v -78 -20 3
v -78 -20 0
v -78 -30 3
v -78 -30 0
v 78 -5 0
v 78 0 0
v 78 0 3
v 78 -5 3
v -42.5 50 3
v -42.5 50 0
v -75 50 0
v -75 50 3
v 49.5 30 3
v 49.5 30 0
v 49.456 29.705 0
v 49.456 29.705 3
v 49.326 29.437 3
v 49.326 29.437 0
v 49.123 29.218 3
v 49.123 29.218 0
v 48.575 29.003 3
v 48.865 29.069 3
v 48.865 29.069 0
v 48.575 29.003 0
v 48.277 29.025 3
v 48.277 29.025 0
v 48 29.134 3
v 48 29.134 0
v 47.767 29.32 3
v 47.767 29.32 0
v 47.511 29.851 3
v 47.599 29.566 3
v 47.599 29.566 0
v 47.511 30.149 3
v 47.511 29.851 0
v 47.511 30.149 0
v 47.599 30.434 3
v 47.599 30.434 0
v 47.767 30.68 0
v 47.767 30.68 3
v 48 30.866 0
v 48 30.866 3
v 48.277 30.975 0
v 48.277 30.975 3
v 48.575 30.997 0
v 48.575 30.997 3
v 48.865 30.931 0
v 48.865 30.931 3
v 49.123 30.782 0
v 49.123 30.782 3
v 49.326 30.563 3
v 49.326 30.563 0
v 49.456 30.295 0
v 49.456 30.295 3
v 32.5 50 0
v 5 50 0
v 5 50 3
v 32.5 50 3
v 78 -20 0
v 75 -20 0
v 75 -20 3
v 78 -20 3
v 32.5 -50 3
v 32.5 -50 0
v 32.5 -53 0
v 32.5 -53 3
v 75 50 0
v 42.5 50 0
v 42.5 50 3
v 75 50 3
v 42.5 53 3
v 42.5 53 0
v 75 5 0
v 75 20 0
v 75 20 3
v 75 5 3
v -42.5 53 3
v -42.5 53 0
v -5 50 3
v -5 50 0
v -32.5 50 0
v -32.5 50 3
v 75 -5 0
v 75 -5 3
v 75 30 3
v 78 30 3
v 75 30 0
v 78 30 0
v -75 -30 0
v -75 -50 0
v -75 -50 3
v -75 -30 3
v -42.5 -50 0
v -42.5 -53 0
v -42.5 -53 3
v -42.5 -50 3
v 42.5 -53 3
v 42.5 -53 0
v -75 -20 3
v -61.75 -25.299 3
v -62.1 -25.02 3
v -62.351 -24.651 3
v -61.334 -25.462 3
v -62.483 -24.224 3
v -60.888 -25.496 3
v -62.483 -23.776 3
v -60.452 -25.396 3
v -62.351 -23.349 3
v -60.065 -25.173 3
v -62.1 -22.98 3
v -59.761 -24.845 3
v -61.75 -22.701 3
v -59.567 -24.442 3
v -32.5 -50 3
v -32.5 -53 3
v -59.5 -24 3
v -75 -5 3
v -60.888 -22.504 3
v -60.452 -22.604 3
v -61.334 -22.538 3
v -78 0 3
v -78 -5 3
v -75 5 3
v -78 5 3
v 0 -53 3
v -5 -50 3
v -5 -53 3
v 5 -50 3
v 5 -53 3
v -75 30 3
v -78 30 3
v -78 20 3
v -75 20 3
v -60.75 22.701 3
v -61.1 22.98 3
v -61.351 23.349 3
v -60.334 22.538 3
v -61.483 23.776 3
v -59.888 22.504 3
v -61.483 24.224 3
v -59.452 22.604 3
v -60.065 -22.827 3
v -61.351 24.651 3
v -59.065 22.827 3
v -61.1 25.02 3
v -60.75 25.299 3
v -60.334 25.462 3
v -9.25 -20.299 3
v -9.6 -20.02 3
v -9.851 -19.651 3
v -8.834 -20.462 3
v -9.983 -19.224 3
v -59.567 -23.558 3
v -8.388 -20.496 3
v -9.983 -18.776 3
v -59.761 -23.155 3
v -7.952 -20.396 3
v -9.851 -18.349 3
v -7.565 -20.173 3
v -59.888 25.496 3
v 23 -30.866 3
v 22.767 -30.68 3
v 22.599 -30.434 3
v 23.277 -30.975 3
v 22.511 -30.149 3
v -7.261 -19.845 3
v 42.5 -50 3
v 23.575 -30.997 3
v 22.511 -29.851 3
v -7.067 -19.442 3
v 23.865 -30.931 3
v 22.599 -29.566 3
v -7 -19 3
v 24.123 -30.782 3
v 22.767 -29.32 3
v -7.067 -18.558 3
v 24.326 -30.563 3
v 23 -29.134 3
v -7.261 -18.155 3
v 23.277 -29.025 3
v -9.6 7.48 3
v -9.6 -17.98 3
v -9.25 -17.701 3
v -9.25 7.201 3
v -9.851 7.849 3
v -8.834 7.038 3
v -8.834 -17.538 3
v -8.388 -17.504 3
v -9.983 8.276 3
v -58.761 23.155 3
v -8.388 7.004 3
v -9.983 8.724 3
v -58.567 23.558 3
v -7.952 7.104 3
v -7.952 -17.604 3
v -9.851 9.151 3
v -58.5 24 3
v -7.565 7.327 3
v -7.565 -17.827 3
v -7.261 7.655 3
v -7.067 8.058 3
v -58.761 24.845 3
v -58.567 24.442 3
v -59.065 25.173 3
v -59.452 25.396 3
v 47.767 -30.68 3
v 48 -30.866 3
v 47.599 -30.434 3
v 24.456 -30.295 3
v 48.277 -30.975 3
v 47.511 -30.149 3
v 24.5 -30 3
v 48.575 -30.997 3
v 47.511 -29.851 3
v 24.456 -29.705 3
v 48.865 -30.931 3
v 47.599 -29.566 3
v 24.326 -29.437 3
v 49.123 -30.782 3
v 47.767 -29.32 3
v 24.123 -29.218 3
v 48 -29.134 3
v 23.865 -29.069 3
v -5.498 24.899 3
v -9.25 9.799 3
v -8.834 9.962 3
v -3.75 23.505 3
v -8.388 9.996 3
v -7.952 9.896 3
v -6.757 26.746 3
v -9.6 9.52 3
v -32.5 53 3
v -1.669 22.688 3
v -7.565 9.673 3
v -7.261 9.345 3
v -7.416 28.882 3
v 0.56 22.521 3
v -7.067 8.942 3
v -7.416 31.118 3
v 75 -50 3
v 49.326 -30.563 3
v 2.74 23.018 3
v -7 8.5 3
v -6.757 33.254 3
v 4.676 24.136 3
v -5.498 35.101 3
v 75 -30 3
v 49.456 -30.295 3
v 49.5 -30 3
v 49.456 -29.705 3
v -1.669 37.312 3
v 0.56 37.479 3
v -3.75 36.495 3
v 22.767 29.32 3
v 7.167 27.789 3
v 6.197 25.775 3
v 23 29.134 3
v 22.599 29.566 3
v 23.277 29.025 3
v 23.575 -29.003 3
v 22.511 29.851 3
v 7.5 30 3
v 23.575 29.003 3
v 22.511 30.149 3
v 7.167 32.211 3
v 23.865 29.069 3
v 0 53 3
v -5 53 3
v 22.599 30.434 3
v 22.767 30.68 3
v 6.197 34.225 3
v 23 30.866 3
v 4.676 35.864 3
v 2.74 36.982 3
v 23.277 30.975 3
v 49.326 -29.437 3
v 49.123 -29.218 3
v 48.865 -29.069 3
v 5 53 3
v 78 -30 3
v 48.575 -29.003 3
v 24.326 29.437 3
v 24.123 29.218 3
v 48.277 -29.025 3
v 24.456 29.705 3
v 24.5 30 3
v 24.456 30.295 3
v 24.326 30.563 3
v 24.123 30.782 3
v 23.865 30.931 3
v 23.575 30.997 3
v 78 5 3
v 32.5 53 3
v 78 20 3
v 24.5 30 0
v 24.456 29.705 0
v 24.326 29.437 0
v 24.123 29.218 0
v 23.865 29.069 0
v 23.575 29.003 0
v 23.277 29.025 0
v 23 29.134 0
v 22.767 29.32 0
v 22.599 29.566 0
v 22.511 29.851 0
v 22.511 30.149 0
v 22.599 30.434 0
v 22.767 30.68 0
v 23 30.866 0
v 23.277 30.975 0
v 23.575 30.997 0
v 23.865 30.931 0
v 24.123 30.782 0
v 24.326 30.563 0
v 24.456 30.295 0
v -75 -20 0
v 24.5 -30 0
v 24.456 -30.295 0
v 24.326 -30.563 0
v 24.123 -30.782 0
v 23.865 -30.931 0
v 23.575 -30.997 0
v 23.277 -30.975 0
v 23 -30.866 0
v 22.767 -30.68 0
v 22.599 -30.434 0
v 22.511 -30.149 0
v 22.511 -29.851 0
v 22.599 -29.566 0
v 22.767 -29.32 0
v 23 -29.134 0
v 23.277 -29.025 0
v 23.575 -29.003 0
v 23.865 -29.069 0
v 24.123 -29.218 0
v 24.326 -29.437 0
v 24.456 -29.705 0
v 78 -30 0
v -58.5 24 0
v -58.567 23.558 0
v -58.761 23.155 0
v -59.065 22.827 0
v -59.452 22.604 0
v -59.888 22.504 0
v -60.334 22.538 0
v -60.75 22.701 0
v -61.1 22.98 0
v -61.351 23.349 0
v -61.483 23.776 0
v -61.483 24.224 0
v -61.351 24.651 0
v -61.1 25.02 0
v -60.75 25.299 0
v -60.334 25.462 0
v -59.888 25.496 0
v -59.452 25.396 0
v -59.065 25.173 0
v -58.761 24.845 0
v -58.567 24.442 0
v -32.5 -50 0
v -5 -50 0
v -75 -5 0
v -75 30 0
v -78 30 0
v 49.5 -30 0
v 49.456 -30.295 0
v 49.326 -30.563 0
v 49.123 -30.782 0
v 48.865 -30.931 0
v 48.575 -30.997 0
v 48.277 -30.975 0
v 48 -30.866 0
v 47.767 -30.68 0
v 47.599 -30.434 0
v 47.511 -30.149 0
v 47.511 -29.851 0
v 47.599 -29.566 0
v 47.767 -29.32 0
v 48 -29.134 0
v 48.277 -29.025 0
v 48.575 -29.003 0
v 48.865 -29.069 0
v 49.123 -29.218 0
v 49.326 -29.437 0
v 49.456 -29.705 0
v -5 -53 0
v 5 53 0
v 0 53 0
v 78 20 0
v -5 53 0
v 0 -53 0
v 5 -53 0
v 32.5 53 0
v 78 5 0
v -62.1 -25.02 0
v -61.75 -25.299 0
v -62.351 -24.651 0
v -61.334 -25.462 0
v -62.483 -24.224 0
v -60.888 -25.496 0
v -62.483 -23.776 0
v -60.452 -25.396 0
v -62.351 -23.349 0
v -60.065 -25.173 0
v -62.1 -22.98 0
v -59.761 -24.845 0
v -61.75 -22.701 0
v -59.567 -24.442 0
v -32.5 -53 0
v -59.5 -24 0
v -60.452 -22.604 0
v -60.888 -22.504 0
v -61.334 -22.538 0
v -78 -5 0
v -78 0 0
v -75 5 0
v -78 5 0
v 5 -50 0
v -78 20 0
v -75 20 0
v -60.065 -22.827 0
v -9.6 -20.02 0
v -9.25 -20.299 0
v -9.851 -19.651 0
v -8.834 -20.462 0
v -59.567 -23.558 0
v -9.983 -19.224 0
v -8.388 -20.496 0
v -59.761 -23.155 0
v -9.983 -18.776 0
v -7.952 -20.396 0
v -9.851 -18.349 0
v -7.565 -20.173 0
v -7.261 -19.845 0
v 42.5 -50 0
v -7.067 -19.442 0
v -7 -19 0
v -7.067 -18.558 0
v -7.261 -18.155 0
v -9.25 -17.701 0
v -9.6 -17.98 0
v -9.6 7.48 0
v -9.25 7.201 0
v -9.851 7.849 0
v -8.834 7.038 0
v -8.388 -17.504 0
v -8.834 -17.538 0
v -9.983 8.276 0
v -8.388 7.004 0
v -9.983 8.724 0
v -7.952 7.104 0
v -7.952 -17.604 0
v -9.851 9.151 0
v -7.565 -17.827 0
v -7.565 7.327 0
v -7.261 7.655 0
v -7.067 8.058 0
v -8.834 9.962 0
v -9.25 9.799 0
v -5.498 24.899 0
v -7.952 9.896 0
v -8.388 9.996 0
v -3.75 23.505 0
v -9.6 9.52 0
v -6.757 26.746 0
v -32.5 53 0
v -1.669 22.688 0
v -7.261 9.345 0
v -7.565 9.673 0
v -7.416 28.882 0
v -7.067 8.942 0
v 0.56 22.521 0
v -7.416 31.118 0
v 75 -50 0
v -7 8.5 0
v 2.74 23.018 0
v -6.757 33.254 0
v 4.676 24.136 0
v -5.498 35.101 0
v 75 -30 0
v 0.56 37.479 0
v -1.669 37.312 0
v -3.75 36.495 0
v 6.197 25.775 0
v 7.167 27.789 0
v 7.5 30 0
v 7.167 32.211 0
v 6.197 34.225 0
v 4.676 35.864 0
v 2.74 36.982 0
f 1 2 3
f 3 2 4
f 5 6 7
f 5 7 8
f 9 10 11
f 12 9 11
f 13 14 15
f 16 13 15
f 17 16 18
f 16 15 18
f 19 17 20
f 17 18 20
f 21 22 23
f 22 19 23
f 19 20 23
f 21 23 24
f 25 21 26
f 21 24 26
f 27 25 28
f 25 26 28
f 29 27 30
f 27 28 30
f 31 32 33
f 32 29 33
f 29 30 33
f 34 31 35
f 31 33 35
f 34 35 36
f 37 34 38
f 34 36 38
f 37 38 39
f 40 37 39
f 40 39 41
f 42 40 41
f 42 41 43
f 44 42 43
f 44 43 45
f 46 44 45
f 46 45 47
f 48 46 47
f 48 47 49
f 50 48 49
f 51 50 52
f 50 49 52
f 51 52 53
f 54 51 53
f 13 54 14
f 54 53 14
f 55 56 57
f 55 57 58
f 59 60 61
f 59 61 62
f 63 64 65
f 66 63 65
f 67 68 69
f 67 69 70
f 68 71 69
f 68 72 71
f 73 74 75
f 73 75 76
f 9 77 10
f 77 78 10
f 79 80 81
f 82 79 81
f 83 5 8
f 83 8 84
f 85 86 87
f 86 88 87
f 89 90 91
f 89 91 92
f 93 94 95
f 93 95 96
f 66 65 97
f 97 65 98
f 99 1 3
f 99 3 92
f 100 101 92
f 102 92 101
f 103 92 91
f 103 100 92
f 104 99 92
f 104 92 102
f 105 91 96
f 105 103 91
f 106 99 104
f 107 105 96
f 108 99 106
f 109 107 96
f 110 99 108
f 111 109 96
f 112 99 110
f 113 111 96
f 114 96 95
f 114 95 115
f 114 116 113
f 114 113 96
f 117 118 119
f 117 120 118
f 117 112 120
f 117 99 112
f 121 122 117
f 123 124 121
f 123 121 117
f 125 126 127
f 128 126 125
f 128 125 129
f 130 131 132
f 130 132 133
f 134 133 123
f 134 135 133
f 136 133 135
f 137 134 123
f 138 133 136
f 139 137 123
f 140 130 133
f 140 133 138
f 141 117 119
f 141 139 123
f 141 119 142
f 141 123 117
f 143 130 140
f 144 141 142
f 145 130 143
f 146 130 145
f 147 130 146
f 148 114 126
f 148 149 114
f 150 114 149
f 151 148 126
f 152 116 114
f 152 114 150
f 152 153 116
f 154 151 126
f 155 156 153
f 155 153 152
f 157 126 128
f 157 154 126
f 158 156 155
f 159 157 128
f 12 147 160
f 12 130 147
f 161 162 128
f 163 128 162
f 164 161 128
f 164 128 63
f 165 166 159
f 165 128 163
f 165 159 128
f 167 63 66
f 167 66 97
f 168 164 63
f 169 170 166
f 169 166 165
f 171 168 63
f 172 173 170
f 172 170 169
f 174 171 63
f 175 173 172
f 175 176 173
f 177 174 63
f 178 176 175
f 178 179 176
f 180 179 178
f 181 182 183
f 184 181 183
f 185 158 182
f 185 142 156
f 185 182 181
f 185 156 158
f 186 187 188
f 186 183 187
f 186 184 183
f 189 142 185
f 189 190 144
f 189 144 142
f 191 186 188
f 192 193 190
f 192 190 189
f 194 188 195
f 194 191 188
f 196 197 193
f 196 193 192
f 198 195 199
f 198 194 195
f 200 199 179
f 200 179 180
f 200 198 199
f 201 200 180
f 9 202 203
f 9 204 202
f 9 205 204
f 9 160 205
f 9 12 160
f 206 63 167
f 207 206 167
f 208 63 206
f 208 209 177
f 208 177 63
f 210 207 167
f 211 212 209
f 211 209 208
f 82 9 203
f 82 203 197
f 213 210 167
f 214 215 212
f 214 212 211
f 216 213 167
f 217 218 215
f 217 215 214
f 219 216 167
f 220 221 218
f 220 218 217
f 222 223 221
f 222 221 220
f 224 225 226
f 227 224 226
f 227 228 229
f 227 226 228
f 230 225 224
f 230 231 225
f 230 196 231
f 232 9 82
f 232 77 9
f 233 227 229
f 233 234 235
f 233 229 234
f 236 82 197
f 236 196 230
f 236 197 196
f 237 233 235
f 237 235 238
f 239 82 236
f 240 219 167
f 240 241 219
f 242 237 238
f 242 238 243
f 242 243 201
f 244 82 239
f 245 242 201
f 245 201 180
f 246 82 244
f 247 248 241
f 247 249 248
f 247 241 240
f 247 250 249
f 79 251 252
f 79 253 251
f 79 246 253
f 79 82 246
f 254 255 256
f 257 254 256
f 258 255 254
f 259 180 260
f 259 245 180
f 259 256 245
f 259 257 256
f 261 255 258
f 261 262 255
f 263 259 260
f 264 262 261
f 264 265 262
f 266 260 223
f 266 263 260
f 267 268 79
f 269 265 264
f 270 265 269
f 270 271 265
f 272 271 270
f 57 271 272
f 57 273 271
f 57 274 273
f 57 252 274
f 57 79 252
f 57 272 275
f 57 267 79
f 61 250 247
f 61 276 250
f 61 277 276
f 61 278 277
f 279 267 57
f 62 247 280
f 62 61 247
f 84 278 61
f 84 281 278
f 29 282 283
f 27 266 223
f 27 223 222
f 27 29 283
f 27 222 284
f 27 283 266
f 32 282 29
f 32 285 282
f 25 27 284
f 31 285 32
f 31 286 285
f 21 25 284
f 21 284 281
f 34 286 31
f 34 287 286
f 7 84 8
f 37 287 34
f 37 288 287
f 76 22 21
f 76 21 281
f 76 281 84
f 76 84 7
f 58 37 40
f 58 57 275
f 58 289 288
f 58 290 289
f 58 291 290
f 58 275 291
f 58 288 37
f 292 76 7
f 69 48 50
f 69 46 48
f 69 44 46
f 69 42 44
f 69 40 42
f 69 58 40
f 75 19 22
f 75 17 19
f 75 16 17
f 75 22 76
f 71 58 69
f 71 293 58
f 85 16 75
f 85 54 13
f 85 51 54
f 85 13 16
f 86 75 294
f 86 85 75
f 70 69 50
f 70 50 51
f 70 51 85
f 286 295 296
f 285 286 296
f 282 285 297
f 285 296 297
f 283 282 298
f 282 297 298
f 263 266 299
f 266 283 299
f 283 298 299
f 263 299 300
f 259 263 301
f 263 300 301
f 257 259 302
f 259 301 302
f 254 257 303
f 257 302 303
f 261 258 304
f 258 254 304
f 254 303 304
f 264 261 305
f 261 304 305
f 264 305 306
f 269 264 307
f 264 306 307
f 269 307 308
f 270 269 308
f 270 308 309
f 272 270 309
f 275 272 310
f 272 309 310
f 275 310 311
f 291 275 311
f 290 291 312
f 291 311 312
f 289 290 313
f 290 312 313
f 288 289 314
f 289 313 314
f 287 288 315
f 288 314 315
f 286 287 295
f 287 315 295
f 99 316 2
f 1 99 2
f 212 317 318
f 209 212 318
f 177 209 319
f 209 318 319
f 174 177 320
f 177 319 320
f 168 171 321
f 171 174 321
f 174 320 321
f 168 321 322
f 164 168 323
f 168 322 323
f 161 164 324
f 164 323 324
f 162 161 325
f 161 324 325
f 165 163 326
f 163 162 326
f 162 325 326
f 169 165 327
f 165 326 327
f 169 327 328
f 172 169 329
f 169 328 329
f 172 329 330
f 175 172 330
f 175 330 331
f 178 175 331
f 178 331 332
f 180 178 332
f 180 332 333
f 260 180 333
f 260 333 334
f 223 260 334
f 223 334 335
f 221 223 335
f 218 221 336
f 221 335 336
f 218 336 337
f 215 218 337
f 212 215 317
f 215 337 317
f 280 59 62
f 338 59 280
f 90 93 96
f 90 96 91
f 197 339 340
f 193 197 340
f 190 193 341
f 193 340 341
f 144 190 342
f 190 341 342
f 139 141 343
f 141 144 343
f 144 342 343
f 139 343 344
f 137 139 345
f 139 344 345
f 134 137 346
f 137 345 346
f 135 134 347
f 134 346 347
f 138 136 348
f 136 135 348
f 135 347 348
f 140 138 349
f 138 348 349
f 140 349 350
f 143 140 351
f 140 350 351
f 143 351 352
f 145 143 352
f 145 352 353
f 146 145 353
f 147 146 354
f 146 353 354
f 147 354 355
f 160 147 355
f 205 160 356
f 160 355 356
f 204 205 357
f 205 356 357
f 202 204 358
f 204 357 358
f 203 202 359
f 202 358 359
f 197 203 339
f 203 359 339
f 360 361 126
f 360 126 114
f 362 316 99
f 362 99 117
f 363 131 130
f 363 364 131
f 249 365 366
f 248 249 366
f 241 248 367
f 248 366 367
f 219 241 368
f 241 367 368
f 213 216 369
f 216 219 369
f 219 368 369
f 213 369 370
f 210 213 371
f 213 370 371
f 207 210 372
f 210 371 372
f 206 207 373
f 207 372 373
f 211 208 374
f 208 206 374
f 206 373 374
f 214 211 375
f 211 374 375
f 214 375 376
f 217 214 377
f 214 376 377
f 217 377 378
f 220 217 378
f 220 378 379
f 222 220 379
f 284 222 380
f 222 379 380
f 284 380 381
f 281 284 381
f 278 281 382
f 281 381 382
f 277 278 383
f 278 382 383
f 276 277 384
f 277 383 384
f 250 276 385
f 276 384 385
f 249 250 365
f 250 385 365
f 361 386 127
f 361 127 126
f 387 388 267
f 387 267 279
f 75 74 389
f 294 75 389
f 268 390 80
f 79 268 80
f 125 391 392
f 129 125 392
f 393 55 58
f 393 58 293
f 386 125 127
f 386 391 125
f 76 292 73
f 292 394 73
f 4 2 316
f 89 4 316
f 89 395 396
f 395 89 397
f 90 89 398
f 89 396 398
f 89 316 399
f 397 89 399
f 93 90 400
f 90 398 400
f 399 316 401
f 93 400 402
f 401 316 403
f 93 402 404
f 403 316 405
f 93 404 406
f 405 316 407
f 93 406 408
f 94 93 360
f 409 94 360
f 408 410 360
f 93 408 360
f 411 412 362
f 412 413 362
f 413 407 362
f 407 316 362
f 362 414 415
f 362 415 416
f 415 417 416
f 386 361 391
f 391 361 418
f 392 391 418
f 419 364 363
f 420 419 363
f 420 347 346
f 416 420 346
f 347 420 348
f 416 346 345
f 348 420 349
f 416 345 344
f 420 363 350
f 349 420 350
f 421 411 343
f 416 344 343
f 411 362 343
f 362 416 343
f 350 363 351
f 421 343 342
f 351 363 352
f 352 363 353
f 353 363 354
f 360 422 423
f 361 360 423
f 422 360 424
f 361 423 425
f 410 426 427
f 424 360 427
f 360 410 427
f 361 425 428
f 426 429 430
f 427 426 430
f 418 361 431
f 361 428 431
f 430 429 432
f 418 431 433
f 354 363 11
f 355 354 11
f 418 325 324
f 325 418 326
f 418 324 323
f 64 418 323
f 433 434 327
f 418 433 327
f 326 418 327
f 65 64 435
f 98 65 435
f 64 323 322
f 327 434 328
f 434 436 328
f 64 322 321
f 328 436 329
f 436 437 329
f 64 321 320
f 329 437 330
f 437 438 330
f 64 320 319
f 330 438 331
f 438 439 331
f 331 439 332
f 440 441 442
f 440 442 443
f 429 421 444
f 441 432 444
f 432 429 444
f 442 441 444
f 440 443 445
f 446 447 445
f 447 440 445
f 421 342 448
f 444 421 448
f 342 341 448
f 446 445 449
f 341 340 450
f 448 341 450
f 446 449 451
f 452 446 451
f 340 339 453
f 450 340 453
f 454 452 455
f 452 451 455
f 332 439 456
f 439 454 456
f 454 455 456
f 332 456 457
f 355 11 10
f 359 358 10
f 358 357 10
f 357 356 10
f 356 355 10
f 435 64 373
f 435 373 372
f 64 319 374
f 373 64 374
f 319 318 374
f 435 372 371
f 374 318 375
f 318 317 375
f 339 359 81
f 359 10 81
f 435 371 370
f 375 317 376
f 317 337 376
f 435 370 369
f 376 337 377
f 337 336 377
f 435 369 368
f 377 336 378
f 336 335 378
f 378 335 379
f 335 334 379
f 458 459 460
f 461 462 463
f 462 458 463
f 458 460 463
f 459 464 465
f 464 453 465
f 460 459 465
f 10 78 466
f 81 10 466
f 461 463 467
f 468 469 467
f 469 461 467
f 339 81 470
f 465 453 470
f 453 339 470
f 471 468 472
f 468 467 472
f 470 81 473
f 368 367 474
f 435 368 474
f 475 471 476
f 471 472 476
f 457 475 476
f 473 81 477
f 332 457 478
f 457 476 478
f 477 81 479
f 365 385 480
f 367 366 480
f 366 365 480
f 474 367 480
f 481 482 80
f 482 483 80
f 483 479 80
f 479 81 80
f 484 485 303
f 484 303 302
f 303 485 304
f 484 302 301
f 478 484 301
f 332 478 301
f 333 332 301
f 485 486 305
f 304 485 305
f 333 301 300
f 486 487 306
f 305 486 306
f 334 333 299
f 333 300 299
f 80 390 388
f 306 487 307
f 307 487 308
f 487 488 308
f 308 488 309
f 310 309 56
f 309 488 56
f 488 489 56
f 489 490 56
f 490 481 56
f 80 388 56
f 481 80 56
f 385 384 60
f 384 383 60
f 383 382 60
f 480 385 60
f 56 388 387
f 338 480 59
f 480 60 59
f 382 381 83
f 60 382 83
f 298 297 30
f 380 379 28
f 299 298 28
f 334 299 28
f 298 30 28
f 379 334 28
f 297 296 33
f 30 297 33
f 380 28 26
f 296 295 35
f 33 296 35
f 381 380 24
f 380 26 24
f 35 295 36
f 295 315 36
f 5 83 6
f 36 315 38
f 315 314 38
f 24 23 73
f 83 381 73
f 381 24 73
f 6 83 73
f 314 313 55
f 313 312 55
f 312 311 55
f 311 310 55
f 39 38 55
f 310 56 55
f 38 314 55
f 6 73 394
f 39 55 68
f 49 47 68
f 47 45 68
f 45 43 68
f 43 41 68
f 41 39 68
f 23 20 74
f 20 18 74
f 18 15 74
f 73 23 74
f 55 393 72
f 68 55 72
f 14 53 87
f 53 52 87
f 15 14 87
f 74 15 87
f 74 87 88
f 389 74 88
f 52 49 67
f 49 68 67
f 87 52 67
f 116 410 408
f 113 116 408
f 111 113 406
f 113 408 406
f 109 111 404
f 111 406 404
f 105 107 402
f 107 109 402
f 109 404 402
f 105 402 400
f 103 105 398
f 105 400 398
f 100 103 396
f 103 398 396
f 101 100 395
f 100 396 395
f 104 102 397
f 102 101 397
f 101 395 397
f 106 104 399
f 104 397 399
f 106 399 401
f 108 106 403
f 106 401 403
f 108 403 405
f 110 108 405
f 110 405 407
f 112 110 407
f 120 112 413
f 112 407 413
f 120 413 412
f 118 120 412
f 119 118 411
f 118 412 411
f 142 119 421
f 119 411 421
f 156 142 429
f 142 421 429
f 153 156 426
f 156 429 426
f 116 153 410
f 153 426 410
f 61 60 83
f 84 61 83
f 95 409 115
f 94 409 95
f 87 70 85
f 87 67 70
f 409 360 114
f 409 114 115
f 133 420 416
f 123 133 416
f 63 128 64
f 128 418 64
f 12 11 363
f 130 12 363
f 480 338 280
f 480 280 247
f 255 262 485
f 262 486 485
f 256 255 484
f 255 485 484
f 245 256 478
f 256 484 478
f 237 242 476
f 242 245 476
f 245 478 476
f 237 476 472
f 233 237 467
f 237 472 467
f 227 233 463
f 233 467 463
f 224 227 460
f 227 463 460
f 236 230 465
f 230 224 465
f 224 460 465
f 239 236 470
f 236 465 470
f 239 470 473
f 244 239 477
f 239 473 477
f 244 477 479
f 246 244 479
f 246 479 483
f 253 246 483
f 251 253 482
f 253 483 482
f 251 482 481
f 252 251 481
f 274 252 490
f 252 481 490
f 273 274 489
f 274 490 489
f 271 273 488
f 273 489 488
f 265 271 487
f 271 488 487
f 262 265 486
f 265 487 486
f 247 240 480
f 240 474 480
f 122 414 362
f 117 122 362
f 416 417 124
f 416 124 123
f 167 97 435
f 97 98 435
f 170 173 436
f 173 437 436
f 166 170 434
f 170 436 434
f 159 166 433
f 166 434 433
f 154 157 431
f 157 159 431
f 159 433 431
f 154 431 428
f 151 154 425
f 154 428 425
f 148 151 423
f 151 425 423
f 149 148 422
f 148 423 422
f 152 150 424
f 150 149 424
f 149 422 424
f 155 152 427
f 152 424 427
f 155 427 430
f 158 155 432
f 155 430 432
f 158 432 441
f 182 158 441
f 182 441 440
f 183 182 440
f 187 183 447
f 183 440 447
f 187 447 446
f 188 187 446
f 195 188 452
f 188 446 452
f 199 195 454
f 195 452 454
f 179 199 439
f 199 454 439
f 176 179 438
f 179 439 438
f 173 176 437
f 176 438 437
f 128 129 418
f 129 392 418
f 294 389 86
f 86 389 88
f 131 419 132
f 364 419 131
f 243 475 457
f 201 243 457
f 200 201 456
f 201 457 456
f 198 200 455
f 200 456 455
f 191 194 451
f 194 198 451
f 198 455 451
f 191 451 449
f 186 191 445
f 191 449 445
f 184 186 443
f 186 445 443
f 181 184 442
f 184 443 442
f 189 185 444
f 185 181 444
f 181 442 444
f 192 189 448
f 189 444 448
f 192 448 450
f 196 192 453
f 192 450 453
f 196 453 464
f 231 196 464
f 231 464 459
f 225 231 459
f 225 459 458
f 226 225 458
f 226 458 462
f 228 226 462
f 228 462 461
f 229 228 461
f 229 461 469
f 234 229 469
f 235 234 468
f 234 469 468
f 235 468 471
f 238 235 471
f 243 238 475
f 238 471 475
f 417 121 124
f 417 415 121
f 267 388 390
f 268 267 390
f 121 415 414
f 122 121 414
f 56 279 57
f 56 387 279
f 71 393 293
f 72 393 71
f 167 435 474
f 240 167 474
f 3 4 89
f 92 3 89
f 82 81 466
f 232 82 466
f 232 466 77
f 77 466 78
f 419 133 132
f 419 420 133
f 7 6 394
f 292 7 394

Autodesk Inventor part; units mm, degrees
ref_plane "YZ Plane" through (0, 0, 0) normal (1, 0, 0) x (0, 1, 0)
ref_plane "XZ Plane" through (0, 0, 0) normal (0, 1, 0) x (-1, 0, 0)
ref_plane "XY Plane" through (0, 0, 0) normal (0, 0, 1) x (1, 0, 0)
sketch "Эскиз1" plane through (0, 0, 0) normal (0, 0, 1) x (1, 0, 0)
  line L0 (0, 53) -> (5, 53)
  line L1 (5, 53) -> (5, 50)
  line L2 (32.5, 53) -> (42.5, 53)
  line L3 (42.5, 53) -> (42.5, 50)
  line L4 (32.5, 50) -> (32.5, 53)
  line L5 (78, 30) -> (75, 30)
  line L6 (75, 20) -> (78, 20)
  line L7 (78, 20) -> (78, 30)
  line L8 (78, 5) -> (75, 5)
  line L9 (78, 0) -> (78, 5)
  line L10 (5, 50) -> (32.5, 50)
  line L11 (42.5, 50) -> (75, 50)
  line L12 (5, 50) -> (32.5, 50)
  line L13 (42.5, 50) -> (75, 50)
  line L14 (75, 50) -> (75, 30)
  line L15 (75, 20) -> (75, 5)
  line L16 (75, 50) -> (75, 30)
  line L17 (75, 20) -> (75, 5)
  line L18 (0, -53) -> (5, -53)
  line L19 (5, -53) -> (5, -50)
  line L20 (32.5, -53) -> (42.5, -53)
  line L21 (42.5, -53) -> (42.5, -50)
  line L22 (32.5, -50) -> (32.5, -53)
  line L23 (78, -30) -> (75, -30)
  line L24 (75, -20) -> (78, -20)
  line L25 (78, -20) -> (78, -30)
  line L26 (78, -5) -> (75, -5)
  line L27 (78, 0) -> (78, -5)
  line L28 (5, -50) -> (32.5, -50)
  line L29 (42.5, -50) -> (75, -50)
  line L30 (5, -50) -> (32.5, -50)
  line L31 (42.5, -50) -> (75, -50)
  line L32 (75, -50) -> (75, -30)
  line L33 (75, -20) -> (75, -5)
  line L34 (75, -50) -> (75, -30)
  line L35 (75, -20) -> (75, -5)
  line L36 (0, 53) -> (-5, 53)
  line L37 (-5, 53) -> (-5, 50)
  line L38 (-32.5, 53) -> (-42.5, 53)
  line L39 (-42.5, 53) -> (-42.5, 50)
  line L40 (-32.5, 50) -> (-32.5, 53)
  line L41 (-78, 30) -> (-75, 30)
  line L42 (-75, 20) -> (-78, 20)
  line L43 (-78, 20) -> (-78, 30)
  line L44 (-78, 5) -> (-75, 5)
  line L45 (-78, 0) -> (-78, 5)
  line L46 (-5, 50) -> (-32.5, 50)
  line L47 (-42.5, 50) -> (-75, 50)
  line L48 (-5, 50) -> (-32.5, 50)
  line L49 (-42.5, 50) -> (-75, 50)
  line L50 (-75, 50) -> (-75, 30)
  line L51 (-75, 20) -> (-75, 5)
  line L52 (-75, 50) -> (-75, 30)
  line L53 (-75, 20) -> (-75, 5)
  line L54 (-32.5, -53) -> (-42.5, -53)
  line L55 (-32.5, -50) -> (-32.5, -53)
  line L56 (-5, -50) -> (-32.5, -50)
  line L57 (-5, -50) -> (-32.5, -50)
  line L58 (-5, -53) -> (-5, -50)
  line L59 (0, -53) -> (-5, -53)
  line L60 (-42.5, -53) -> (-42.5, -50)
  line L61 (-42.5, -50) -> (-75, -50)
  line L62 (-42.5, -50) -> (-75, -50)
  line L63 (-75, -50) -> (-75, -30)
  line L64 (-75, -50) -> (-75, -30)
  line L65 (-78, -30) -> (-75, -30)
  line L66 (-75, -20) -> (-78, -20)
  line L67 (-78, -20) -> (-78, -30)
  line L68 (-75, -20) -> (-75, -5)
  line L69 (-75, -20) -> (-75, -5)
  line L70 (-78, -5) -> (-75, -5)
  line L71 (-78, 0) -> (-78, -5)
  circle A0 centre (23.5, 30) radius 1
  circle A1 centre (48.5, 30) radius 1
  circle A2 centre (23.5, -30) radius 1
  circle A3 centre (48.5, -30) radius 1
  circle A4 centre (-60, 24) radius 1.5
  circle A5 centre (-61, -24) radius 1.5
  circle A6 centre (-8.5, -19) radius 1.5
  circle A7 centre (-8.5, 8.5) radius 1.5
  circle A8 centre (0, 30) radius 7.5
  point P0 (37.5, 50)
  point P1 (75, 25)
  point P2 (37.5, -50)
  point P3 (75, -25)
  point P4 (-37.5, 50)
  point P5 (-37.5, -50)
  point P6 (36, 0)
  dimension "d48" = 15
extrude "Выдавливание3" add sketch "Эскиз1" along normal blind 3
sketch "Эскиз3" plane through (0, 0, 3) normal (0, 0, 1) x (1, 0, 0)
  line L0 (-75, 30) -> (-78, 30) projected
  line L1 (-42.5, 50) -> (-75, 50) projected
  line L2 (-78, 20) -> (-75, 20) projected
  line L3 (-75, 5) -> (-78, 5) projected
  line L4 (-75, -50) -> (-42.5, -50) projected
  point P0 (0, 0)
  dimension "d51" = 20
  dimension "d52" = 10
  dimension "d53" = 15
  dimension "d54" = 100
properties part number "крепления"
